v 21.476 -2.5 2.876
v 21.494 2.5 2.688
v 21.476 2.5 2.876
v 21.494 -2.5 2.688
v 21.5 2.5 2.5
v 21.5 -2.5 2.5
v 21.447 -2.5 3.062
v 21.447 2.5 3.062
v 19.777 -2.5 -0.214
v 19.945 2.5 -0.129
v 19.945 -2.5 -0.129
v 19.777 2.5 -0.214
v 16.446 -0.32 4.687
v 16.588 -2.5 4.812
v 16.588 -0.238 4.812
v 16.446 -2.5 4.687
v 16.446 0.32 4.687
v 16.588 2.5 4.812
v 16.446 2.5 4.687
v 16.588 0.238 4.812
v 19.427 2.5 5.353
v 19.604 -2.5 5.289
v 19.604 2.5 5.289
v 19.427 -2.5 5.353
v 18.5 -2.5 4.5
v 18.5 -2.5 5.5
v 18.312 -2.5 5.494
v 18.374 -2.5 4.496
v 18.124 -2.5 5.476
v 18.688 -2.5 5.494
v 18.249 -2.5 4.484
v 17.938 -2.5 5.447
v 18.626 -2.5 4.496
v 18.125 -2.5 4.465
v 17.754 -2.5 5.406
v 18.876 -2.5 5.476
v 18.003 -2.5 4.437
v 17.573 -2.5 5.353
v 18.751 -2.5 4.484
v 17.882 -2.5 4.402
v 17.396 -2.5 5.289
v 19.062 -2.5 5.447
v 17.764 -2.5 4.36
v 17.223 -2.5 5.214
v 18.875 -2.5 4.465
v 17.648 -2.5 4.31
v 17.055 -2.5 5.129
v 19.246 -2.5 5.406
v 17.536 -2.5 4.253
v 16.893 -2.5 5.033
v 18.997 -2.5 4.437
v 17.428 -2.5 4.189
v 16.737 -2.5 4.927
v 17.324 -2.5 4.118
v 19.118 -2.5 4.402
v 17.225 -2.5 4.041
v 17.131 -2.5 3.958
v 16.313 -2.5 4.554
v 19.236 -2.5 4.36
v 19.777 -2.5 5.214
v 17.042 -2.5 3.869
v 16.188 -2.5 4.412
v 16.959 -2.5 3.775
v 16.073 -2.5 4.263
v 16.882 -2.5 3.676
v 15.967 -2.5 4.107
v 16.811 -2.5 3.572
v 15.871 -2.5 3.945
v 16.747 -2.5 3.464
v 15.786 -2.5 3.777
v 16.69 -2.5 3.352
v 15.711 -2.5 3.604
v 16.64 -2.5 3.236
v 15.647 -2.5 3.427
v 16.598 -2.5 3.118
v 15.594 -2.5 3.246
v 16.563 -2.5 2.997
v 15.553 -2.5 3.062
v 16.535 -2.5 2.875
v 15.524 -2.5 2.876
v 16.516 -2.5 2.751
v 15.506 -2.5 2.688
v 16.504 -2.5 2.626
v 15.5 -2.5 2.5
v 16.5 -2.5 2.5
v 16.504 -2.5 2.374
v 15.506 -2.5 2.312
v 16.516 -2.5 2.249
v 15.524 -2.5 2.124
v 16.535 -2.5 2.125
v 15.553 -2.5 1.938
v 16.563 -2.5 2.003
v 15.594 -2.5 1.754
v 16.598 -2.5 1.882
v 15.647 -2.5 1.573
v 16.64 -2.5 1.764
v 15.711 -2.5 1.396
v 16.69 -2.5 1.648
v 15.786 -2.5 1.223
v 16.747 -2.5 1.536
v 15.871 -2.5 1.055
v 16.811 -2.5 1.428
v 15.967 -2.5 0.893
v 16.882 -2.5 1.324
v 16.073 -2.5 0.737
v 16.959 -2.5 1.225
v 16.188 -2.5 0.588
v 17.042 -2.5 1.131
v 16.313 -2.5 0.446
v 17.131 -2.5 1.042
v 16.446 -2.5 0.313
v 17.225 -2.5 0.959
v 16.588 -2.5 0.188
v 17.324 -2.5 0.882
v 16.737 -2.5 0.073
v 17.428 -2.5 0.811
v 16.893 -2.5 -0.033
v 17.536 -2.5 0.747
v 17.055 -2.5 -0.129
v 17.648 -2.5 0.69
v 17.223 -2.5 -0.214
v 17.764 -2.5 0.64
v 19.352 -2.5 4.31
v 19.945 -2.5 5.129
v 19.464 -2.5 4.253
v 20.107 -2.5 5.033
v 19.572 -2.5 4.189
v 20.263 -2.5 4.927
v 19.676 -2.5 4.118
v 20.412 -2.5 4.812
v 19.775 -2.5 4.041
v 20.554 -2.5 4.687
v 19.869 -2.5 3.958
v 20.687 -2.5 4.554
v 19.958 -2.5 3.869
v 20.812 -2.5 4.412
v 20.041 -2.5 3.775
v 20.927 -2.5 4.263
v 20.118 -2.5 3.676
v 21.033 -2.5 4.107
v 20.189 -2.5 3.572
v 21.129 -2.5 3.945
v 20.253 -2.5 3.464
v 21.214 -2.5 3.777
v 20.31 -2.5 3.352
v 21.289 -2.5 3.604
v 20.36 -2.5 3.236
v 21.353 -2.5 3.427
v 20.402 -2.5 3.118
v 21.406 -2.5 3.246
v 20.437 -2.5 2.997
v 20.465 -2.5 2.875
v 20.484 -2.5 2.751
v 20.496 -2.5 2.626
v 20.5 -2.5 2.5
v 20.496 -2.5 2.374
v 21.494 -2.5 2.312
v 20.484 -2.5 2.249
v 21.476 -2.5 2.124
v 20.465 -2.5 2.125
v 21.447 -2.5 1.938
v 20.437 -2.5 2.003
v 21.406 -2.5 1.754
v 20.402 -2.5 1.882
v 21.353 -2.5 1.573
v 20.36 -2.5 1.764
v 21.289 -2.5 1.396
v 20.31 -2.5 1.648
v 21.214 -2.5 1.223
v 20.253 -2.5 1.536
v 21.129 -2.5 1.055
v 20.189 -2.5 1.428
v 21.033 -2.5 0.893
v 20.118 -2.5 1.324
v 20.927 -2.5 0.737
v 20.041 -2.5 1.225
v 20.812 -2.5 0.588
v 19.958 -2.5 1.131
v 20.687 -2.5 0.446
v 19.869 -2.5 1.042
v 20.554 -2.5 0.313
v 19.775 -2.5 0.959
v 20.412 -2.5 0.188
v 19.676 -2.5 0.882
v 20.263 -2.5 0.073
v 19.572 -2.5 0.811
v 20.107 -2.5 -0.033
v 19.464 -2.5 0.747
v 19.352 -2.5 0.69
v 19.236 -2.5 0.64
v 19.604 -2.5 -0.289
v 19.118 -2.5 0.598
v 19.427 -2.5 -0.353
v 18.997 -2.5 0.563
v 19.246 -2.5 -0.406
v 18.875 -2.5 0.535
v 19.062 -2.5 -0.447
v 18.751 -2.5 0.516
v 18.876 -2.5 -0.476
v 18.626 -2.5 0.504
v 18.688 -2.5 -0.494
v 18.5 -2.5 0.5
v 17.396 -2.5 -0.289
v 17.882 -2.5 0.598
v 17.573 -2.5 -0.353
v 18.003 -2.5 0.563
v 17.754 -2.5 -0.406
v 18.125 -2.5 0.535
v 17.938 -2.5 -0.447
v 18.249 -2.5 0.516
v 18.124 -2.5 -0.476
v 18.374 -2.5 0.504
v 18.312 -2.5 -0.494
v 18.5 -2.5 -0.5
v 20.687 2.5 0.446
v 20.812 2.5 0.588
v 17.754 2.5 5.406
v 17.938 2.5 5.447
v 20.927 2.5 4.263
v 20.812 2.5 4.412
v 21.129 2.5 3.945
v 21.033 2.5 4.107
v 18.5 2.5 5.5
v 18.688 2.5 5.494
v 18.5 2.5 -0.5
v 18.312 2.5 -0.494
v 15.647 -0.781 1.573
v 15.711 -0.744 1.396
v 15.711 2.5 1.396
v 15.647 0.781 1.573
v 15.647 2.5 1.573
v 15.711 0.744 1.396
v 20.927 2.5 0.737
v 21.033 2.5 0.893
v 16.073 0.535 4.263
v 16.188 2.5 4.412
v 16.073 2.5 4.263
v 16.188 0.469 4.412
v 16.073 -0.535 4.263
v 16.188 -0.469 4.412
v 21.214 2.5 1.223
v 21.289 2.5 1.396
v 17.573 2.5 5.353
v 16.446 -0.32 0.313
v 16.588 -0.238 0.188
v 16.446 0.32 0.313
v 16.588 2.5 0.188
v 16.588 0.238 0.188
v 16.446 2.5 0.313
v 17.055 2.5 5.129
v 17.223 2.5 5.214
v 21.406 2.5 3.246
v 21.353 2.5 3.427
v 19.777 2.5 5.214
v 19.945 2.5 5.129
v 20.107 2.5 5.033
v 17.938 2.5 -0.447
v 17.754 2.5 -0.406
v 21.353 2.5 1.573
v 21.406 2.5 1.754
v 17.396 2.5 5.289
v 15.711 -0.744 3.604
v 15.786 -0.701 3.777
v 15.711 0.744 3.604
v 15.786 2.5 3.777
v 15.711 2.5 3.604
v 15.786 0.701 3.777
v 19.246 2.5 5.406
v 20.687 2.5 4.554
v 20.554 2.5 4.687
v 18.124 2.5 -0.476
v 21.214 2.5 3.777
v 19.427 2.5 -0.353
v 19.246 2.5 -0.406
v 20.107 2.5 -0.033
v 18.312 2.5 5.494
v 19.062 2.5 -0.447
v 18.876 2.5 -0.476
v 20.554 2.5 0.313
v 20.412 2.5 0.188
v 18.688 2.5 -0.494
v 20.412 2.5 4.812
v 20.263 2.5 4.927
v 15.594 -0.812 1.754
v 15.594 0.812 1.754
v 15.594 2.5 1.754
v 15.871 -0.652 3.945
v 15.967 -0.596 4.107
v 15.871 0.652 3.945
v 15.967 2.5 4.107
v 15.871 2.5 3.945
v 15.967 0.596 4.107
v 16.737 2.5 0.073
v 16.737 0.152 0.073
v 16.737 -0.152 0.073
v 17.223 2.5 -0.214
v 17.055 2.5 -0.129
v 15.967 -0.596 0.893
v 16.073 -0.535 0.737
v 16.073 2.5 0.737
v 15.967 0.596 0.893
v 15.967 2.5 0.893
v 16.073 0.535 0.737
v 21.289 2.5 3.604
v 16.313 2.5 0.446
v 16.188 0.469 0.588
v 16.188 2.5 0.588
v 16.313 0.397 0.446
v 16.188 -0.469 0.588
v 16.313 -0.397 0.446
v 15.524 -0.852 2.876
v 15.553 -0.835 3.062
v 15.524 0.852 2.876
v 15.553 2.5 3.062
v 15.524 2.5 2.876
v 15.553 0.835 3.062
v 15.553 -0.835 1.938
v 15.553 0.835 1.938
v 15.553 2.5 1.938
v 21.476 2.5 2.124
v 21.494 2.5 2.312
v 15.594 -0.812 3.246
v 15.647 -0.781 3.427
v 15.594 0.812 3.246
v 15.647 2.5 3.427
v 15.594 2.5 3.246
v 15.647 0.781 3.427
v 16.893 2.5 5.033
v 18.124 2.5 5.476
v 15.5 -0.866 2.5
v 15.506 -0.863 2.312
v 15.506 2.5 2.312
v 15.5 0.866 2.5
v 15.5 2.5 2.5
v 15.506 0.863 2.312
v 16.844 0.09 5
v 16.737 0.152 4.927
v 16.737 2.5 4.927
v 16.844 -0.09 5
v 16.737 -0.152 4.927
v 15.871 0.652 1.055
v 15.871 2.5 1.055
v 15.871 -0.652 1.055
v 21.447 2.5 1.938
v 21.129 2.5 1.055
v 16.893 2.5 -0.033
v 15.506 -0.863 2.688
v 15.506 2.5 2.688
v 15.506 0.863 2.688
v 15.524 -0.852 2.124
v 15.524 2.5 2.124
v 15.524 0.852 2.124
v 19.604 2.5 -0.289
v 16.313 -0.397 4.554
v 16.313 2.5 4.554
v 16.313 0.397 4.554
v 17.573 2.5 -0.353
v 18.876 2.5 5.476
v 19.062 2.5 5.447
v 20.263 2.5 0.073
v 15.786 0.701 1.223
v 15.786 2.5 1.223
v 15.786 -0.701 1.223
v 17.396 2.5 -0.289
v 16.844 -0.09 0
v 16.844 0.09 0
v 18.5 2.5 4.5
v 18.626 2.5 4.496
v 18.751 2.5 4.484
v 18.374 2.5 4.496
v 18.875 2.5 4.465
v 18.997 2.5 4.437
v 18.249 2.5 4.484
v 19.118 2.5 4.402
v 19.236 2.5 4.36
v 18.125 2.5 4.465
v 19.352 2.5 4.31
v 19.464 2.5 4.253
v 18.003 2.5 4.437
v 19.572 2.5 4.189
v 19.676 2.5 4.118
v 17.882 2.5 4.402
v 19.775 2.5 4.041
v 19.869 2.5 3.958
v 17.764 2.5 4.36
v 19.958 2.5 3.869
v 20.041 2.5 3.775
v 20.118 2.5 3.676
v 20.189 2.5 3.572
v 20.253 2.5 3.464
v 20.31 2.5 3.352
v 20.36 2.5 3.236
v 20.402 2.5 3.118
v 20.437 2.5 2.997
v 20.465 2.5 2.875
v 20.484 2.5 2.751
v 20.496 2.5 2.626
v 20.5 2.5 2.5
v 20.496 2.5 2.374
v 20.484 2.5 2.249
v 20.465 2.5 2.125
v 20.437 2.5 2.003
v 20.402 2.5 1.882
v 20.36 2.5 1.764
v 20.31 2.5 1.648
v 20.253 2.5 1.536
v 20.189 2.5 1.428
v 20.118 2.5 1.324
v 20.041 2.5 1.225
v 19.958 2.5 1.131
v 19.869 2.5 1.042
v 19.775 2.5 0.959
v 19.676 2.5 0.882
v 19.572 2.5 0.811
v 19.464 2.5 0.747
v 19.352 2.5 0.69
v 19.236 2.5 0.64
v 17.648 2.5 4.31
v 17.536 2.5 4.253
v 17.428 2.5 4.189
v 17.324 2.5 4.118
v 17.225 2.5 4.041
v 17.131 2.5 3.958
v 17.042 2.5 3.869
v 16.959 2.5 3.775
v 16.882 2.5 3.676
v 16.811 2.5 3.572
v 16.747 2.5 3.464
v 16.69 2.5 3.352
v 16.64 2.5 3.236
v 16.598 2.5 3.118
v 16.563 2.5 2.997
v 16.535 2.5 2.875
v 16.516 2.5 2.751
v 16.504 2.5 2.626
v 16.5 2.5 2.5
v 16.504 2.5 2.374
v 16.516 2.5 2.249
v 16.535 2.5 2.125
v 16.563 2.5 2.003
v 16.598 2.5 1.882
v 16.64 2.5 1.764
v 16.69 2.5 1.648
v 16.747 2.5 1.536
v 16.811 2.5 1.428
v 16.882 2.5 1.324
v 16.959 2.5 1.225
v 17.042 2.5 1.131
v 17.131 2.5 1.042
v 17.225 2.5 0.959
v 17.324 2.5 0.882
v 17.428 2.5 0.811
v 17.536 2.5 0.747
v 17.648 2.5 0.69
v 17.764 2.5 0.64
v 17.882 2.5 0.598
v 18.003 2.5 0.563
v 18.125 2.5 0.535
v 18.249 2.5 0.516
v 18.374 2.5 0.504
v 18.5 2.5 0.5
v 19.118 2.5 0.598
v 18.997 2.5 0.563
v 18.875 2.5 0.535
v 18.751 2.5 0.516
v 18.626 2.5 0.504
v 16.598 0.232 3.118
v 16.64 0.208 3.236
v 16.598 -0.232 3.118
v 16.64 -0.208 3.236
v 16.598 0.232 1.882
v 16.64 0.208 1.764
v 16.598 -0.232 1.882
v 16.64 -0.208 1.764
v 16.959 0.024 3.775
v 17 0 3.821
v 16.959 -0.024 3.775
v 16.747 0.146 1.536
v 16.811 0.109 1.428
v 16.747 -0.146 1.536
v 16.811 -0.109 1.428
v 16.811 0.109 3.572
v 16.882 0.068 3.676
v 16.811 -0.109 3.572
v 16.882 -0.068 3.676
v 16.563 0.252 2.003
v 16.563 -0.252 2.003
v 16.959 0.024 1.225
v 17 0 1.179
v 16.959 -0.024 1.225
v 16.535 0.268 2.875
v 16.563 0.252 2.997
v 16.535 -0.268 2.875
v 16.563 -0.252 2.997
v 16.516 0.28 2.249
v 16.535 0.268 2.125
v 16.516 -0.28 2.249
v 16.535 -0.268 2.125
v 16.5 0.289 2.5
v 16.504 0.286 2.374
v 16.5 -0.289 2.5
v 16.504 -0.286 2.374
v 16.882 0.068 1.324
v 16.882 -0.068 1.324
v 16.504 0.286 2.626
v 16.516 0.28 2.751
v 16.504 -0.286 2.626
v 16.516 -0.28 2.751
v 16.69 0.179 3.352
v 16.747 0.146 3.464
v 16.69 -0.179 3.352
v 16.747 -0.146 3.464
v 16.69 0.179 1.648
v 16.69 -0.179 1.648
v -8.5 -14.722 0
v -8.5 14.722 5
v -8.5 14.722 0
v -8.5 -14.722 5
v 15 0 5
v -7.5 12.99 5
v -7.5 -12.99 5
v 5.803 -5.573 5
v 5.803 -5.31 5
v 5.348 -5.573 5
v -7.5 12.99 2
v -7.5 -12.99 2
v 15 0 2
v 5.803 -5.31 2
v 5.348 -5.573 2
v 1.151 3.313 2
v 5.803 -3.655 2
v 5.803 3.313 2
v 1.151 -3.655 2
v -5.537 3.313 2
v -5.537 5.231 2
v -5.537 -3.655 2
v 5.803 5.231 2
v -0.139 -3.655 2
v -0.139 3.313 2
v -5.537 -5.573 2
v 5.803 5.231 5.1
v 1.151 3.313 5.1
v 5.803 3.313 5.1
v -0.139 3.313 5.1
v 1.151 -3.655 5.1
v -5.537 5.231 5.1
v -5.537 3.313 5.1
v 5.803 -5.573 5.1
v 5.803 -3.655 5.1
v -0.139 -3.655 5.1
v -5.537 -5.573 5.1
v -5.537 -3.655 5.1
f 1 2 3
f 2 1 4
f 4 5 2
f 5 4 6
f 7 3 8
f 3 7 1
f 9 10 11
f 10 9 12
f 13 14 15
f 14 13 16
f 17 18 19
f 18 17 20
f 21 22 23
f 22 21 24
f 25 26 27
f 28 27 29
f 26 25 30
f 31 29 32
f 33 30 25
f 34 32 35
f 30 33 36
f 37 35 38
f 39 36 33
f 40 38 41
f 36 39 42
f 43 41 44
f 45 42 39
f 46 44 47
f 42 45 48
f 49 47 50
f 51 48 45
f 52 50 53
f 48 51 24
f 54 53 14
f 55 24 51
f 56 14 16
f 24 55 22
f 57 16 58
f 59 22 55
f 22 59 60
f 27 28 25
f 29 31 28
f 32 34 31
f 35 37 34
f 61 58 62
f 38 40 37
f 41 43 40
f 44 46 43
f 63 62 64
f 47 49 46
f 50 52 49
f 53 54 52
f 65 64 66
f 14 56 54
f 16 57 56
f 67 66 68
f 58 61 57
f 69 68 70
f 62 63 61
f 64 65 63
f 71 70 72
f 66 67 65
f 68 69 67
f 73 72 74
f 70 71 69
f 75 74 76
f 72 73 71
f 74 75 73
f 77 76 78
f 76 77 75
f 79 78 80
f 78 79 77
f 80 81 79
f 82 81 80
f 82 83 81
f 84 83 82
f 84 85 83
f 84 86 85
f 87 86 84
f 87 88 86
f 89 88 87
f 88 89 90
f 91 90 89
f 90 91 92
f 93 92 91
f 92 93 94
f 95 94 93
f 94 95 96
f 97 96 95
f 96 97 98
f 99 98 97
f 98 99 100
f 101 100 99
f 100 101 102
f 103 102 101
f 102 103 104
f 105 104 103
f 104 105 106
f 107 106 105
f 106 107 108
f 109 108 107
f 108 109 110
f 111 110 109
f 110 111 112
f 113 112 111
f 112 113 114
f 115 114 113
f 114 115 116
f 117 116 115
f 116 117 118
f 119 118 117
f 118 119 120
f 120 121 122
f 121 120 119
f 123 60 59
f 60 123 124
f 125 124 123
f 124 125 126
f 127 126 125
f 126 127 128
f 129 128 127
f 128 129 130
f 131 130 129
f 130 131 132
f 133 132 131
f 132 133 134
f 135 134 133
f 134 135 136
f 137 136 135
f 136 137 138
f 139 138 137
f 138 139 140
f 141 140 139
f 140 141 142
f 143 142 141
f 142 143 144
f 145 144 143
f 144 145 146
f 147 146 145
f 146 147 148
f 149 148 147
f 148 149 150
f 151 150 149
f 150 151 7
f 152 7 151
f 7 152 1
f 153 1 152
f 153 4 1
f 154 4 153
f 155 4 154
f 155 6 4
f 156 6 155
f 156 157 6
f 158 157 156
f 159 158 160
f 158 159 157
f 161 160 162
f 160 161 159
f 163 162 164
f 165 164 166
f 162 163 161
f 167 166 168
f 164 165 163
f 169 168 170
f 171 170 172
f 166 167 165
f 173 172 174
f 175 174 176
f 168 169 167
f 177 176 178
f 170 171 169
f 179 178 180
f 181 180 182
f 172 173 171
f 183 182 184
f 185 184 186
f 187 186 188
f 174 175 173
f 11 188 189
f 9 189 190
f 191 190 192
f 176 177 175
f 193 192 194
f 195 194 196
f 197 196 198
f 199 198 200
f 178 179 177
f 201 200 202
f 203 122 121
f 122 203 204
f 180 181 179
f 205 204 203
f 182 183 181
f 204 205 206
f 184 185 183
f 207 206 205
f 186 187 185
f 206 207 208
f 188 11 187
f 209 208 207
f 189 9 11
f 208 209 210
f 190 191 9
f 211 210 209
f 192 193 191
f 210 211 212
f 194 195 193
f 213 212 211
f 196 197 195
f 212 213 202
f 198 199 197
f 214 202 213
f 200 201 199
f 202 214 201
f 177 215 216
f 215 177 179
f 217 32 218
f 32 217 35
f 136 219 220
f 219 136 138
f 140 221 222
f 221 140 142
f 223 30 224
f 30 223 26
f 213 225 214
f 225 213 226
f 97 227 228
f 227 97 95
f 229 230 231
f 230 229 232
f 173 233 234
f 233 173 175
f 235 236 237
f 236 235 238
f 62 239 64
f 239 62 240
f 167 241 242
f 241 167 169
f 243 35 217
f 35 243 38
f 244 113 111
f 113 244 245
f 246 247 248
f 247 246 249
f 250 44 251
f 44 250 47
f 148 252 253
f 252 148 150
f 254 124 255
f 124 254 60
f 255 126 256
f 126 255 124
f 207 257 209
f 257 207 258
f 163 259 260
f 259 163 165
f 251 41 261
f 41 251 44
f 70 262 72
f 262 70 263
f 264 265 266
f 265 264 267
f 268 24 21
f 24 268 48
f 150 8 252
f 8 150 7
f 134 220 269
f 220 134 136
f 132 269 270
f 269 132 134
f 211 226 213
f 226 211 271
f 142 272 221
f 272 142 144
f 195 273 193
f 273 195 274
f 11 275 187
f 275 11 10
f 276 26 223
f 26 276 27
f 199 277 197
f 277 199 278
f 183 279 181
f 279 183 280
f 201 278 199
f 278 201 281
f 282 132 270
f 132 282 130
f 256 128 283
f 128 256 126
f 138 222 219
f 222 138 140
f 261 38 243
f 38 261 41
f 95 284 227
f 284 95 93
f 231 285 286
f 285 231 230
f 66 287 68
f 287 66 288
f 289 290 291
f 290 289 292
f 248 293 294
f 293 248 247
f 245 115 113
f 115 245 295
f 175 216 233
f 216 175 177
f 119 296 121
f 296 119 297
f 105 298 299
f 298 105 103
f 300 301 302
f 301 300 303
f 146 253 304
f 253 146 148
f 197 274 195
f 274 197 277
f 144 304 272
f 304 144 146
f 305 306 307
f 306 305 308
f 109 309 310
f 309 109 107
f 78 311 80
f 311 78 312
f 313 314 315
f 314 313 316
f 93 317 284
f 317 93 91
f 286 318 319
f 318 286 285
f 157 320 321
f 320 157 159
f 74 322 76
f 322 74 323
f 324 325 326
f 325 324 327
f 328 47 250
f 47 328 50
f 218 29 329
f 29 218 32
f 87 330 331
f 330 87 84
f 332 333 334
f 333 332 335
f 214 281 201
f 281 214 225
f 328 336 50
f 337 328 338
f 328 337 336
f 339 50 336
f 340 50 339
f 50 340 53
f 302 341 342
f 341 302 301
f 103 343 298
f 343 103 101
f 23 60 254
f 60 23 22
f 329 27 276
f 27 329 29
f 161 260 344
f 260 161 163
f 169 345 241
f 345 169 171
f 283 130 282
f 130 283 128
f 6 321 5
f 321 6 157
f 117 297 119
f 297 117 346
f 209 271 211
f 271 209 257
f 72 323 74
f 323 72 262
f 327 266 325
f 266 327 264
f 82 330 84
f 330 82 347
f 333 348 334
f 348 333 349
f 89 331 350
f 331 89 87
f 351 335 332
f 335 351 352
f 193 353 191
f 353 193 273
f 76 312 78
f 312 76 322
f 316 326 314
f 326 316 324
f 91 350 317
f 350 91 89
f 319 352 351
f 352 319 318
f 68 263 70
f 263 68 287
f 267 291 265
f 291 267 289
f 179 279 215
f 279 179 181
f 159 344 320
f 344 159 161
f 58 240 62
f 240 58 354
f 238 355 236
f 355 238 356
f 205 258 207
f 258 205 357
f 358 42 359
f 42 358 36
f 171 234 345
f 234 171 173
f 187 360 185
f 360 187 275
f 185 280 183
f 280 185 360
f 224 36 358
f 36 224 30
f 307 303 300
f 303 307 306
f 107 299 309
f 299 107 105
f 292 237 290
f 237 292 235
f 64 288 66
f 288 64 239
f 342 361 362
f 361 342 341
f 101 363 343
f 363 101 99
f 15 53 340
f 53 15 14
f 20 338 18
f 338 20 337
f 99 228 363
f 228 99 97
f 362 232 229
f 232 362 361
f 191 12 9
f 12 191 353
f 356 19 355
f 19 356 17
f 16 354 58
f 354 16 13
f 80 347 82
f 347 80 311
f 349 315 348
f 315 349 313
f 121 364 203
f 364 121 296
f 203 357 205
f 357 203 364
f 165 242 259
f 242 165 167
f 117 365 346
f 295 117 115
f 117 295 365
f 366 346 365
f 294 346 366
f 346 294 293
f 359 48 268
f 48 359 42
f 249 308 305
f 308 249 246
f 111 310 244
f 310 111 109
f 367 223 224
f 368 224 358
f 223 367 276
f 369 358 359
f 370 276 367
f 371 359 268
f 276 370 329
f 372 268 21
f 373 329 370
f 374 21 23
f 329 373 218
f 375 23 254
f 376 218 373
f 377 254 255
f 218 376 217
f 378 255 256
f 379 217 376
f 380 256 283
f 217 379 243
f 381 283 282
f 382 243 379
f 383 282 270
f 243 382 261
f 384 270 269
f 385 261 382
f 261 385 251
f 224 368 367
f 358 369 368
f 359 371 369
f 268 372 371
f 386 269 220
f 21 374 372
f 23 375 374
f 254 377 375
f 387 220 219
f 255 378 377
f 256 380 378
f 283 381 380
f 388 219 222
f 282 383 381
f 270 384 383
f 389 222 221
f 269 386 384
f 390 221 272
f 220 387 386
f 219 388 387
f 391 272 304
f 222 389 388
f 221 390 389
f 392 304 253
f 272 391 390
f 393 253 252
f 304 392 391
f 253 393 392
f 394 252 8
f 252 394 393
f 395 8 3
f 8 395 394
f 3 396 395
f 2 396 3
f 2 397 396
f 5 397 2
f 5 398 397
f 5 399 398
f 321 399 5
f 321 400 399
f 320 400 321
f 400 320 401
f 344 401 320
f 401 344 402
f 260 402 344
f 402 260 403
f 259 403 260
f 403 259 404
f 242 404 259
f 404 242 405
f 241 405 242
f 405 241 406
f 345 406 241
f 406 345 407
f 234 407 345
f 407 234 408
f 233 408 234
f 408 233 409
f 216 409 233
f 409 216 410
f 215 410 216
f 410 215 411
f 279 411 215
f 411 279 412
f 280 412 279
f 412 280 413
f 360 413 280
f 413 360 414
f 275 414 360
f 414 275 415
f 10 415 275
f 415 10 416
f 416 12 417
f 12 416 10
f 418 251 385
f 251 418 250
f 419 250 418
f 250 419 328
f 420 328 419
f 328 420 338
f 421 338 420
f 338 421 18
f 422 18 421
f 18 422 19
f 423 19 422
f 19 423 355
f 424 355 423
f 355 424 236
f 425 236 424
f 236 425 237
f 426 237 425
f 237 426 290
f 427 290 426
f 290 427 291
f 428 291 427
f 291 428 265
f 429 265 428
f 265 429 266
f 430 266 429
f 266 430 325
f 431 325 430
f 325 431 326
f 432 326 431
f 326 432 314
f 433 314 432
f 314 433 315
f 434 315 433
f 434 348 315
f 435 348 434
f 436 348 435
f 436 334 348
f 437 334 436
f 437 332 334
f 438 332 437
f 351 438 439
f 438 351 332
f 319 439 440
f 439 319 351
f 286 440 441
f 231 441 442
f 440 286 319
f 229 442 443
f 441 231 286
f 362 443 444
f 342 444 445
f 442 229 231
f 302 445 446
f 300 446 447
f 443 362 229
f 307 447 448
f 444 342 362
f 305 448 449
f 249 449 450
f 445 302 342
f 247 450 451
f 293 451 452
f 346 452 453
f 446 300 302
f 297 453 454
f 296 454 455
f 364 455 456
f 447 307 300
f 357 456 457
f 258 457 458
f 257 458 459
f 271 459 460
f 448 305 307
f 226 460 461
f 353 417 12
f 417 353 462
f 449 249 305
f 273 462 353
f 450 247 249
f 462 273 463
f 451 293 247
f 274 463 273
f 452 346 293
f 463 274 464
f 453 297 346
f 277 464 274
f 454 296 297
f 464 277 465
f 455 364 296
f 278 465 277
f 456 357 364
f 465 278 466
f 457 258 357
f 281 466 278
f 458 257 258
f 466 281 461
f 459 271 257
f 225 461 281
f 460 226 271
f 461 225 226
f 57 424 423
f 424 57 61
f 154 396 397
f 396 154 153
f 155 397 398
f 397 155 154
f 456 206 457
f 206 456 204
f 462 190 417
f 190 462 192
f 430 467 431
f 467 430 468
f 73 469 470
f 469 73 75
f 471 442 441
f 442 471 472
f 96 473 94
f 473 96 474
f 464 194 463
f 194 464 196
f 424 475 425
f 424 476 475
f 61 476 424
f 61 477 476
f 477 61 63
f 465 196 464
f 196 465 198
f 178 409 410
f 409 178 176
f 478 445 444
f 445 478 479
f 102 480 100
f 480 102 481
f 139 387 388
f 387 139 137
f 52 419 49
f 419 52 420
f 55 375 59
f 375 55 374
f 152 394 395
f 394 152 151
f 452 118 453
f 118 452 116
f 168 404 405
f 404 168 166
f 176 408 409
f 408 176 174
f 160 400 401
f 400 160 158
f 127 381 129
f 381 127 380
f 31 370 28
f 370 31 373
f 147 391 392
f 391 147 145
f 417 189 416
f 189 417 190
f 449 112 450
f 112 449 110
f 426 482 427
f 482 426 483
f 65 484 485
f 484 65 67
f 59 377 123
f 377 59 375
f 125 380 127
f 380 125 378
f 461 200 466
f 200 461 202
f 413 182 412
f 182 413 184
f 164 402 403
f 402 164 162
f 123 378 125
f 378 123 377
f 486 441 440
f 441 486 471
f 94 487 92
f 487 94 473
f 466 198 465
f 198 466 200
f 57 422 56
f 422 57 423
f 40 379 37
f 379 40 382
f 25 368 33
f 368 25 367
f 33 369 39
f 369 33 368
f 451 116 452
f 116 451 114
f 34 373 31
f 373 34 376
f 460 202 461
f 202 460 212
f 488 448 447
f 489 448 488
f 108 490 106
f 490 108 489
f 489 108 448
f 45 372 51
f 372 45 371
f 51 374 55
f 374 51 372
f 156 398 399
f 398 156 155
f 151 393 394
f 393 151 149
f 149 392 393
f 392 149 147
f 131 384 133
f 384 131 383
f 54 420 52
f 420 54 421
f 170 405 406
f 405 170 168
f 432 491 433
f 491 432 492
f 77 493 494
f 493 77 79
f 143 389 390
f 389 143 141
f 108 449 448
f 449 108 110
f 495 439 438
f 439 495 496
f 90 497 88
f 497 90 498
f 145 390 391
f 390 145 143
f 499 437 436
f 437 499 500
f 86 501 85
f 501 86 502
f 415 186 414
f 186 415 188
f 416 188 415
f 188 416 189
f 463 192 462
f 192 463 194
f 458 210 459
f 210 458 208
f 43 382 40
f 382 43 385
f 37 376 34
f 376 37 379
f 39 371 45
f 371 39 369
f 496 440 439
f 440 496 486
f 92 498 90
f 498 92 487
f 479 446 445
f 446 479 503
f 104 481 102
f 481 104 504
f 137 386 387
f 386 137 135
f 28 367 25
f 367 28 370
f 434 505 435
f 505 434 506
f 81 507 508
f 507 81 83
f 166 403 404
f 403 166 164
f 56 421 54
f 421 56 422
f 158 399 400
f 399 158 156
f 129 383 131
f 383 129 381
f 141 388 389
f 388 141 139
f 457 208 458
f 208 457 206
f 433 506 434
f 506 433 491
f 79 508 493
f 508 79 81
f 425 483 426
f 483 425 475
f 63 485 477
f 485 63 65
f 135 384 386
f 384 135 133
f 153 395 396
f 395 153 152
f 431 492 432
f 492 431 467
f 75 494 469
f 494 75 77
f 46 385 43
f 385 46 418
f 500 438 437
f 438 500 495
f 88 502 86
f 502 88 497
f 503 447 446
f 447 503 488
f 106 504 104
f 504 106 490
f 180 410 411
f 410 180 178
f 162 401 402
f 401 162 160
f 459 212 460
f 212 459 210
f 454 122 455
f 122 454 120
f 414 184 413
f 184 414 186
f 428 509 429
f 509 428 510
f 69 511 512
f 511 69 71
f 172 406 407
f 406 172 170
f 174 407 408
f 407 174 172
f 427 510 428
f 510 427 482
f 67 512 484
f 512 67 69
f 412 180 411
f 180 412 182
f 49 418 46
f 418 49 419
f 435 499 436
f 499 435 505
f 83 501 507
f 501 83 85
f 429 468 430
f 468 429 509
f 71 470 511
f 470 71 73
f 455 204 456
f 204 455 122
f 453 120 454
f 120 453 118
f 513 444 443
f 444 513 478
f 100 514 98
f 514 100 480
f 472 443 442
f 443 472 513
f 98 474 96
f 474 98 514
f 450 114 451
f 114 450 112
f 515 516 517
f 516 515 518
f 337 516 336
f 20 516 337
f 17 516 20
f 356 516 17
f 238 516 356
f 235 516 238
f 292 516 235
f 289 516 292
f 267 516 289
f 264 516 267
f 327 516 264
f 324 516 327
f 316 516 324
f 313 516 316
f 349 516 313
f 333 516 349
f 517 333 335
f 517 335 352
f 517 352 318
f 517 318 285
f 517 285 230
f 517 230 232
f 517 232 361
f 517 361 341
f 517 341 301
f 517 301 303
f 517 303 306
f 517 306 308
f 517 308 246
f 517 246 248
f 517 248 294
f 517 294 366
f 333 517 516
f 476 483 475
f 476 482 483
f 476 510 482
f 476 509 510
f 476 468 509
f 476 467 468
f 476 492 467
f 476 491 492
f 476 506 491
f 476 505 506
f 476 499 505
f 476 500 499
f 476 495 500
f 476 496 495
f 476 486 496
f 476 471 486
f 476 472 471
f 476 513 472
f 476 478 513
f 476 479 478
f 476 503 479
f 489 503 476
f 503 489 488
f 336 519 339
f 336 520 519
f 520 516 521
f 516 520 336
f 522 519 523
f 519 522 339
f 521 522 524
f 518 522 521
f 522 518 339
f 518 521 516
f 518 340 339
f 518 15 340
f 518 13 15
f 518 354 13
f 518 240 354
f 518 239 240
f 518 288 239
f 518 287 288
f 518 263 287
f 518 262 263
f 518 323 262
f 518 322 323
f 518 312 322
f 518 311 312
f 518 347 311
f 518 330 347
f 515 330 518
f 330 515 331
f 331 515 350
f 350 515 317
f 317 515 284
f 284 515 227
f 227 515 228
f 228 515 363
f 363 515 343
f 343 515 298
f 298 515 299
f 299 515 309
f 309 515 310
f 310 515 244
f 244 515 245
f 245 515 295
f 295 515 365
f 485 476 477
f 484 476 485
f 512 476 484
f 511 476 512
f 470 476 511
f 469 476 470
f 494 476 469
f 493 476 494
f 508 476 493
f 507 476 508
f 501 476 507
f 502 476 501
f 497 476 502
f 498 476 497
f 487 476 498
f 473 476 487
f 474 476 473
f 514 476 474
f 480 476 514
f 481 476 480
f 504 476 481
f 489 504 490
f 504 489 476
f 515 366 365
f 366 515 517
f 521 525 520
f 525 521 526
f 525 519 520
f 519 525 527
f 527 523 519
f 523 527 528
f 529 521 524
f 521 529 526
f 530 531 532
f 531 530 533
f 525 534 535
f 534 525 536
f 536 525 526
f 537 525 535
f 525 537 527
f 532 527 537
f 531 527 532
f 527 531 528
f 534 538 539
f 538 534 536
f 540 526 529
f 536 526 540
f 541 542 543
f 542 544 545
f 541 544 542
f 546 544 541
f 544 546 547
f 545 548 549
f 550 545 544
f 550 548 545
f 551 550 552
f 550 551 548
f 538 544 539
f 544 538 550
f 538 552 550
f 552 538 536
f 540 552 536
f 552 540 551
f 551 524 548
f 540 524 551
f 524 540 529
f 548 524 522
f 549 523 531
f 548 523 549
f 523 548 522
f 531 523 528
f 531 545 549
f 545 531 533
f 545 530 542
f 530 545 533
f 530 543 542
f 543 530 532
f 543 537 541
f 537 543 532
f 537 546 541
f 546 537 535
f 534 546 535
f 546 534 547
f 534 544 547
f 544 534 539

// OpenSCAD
union() {
        rotate([90,0,0]){
        translate(v=[18.5,2.5,-2.5]) {
        difference() {        
        color("grey")
        cylinder(r=3,h=5,$fn=100);
        translate(v=[0,0,-1]) {
        cylinder(r=2,h=7,$fn=100);}
        }
        }
    }
    
    difference() {
        color("grey")
        cylinder(r=17,h=5,$fn=3);
        color("grey")
        translate(v=[0,0,2]) {
            cylinder(r=15,h=5,$fn=3);
        }
    }
    scale([2.8,3.5,1.7]) {  
        linear_extrude(height=3) { 
           rotate([0, 0, 270]) {
          text("H",4, font="Algerian",halign = "center", valign = "center");  
           }
        } 
    } 
}
